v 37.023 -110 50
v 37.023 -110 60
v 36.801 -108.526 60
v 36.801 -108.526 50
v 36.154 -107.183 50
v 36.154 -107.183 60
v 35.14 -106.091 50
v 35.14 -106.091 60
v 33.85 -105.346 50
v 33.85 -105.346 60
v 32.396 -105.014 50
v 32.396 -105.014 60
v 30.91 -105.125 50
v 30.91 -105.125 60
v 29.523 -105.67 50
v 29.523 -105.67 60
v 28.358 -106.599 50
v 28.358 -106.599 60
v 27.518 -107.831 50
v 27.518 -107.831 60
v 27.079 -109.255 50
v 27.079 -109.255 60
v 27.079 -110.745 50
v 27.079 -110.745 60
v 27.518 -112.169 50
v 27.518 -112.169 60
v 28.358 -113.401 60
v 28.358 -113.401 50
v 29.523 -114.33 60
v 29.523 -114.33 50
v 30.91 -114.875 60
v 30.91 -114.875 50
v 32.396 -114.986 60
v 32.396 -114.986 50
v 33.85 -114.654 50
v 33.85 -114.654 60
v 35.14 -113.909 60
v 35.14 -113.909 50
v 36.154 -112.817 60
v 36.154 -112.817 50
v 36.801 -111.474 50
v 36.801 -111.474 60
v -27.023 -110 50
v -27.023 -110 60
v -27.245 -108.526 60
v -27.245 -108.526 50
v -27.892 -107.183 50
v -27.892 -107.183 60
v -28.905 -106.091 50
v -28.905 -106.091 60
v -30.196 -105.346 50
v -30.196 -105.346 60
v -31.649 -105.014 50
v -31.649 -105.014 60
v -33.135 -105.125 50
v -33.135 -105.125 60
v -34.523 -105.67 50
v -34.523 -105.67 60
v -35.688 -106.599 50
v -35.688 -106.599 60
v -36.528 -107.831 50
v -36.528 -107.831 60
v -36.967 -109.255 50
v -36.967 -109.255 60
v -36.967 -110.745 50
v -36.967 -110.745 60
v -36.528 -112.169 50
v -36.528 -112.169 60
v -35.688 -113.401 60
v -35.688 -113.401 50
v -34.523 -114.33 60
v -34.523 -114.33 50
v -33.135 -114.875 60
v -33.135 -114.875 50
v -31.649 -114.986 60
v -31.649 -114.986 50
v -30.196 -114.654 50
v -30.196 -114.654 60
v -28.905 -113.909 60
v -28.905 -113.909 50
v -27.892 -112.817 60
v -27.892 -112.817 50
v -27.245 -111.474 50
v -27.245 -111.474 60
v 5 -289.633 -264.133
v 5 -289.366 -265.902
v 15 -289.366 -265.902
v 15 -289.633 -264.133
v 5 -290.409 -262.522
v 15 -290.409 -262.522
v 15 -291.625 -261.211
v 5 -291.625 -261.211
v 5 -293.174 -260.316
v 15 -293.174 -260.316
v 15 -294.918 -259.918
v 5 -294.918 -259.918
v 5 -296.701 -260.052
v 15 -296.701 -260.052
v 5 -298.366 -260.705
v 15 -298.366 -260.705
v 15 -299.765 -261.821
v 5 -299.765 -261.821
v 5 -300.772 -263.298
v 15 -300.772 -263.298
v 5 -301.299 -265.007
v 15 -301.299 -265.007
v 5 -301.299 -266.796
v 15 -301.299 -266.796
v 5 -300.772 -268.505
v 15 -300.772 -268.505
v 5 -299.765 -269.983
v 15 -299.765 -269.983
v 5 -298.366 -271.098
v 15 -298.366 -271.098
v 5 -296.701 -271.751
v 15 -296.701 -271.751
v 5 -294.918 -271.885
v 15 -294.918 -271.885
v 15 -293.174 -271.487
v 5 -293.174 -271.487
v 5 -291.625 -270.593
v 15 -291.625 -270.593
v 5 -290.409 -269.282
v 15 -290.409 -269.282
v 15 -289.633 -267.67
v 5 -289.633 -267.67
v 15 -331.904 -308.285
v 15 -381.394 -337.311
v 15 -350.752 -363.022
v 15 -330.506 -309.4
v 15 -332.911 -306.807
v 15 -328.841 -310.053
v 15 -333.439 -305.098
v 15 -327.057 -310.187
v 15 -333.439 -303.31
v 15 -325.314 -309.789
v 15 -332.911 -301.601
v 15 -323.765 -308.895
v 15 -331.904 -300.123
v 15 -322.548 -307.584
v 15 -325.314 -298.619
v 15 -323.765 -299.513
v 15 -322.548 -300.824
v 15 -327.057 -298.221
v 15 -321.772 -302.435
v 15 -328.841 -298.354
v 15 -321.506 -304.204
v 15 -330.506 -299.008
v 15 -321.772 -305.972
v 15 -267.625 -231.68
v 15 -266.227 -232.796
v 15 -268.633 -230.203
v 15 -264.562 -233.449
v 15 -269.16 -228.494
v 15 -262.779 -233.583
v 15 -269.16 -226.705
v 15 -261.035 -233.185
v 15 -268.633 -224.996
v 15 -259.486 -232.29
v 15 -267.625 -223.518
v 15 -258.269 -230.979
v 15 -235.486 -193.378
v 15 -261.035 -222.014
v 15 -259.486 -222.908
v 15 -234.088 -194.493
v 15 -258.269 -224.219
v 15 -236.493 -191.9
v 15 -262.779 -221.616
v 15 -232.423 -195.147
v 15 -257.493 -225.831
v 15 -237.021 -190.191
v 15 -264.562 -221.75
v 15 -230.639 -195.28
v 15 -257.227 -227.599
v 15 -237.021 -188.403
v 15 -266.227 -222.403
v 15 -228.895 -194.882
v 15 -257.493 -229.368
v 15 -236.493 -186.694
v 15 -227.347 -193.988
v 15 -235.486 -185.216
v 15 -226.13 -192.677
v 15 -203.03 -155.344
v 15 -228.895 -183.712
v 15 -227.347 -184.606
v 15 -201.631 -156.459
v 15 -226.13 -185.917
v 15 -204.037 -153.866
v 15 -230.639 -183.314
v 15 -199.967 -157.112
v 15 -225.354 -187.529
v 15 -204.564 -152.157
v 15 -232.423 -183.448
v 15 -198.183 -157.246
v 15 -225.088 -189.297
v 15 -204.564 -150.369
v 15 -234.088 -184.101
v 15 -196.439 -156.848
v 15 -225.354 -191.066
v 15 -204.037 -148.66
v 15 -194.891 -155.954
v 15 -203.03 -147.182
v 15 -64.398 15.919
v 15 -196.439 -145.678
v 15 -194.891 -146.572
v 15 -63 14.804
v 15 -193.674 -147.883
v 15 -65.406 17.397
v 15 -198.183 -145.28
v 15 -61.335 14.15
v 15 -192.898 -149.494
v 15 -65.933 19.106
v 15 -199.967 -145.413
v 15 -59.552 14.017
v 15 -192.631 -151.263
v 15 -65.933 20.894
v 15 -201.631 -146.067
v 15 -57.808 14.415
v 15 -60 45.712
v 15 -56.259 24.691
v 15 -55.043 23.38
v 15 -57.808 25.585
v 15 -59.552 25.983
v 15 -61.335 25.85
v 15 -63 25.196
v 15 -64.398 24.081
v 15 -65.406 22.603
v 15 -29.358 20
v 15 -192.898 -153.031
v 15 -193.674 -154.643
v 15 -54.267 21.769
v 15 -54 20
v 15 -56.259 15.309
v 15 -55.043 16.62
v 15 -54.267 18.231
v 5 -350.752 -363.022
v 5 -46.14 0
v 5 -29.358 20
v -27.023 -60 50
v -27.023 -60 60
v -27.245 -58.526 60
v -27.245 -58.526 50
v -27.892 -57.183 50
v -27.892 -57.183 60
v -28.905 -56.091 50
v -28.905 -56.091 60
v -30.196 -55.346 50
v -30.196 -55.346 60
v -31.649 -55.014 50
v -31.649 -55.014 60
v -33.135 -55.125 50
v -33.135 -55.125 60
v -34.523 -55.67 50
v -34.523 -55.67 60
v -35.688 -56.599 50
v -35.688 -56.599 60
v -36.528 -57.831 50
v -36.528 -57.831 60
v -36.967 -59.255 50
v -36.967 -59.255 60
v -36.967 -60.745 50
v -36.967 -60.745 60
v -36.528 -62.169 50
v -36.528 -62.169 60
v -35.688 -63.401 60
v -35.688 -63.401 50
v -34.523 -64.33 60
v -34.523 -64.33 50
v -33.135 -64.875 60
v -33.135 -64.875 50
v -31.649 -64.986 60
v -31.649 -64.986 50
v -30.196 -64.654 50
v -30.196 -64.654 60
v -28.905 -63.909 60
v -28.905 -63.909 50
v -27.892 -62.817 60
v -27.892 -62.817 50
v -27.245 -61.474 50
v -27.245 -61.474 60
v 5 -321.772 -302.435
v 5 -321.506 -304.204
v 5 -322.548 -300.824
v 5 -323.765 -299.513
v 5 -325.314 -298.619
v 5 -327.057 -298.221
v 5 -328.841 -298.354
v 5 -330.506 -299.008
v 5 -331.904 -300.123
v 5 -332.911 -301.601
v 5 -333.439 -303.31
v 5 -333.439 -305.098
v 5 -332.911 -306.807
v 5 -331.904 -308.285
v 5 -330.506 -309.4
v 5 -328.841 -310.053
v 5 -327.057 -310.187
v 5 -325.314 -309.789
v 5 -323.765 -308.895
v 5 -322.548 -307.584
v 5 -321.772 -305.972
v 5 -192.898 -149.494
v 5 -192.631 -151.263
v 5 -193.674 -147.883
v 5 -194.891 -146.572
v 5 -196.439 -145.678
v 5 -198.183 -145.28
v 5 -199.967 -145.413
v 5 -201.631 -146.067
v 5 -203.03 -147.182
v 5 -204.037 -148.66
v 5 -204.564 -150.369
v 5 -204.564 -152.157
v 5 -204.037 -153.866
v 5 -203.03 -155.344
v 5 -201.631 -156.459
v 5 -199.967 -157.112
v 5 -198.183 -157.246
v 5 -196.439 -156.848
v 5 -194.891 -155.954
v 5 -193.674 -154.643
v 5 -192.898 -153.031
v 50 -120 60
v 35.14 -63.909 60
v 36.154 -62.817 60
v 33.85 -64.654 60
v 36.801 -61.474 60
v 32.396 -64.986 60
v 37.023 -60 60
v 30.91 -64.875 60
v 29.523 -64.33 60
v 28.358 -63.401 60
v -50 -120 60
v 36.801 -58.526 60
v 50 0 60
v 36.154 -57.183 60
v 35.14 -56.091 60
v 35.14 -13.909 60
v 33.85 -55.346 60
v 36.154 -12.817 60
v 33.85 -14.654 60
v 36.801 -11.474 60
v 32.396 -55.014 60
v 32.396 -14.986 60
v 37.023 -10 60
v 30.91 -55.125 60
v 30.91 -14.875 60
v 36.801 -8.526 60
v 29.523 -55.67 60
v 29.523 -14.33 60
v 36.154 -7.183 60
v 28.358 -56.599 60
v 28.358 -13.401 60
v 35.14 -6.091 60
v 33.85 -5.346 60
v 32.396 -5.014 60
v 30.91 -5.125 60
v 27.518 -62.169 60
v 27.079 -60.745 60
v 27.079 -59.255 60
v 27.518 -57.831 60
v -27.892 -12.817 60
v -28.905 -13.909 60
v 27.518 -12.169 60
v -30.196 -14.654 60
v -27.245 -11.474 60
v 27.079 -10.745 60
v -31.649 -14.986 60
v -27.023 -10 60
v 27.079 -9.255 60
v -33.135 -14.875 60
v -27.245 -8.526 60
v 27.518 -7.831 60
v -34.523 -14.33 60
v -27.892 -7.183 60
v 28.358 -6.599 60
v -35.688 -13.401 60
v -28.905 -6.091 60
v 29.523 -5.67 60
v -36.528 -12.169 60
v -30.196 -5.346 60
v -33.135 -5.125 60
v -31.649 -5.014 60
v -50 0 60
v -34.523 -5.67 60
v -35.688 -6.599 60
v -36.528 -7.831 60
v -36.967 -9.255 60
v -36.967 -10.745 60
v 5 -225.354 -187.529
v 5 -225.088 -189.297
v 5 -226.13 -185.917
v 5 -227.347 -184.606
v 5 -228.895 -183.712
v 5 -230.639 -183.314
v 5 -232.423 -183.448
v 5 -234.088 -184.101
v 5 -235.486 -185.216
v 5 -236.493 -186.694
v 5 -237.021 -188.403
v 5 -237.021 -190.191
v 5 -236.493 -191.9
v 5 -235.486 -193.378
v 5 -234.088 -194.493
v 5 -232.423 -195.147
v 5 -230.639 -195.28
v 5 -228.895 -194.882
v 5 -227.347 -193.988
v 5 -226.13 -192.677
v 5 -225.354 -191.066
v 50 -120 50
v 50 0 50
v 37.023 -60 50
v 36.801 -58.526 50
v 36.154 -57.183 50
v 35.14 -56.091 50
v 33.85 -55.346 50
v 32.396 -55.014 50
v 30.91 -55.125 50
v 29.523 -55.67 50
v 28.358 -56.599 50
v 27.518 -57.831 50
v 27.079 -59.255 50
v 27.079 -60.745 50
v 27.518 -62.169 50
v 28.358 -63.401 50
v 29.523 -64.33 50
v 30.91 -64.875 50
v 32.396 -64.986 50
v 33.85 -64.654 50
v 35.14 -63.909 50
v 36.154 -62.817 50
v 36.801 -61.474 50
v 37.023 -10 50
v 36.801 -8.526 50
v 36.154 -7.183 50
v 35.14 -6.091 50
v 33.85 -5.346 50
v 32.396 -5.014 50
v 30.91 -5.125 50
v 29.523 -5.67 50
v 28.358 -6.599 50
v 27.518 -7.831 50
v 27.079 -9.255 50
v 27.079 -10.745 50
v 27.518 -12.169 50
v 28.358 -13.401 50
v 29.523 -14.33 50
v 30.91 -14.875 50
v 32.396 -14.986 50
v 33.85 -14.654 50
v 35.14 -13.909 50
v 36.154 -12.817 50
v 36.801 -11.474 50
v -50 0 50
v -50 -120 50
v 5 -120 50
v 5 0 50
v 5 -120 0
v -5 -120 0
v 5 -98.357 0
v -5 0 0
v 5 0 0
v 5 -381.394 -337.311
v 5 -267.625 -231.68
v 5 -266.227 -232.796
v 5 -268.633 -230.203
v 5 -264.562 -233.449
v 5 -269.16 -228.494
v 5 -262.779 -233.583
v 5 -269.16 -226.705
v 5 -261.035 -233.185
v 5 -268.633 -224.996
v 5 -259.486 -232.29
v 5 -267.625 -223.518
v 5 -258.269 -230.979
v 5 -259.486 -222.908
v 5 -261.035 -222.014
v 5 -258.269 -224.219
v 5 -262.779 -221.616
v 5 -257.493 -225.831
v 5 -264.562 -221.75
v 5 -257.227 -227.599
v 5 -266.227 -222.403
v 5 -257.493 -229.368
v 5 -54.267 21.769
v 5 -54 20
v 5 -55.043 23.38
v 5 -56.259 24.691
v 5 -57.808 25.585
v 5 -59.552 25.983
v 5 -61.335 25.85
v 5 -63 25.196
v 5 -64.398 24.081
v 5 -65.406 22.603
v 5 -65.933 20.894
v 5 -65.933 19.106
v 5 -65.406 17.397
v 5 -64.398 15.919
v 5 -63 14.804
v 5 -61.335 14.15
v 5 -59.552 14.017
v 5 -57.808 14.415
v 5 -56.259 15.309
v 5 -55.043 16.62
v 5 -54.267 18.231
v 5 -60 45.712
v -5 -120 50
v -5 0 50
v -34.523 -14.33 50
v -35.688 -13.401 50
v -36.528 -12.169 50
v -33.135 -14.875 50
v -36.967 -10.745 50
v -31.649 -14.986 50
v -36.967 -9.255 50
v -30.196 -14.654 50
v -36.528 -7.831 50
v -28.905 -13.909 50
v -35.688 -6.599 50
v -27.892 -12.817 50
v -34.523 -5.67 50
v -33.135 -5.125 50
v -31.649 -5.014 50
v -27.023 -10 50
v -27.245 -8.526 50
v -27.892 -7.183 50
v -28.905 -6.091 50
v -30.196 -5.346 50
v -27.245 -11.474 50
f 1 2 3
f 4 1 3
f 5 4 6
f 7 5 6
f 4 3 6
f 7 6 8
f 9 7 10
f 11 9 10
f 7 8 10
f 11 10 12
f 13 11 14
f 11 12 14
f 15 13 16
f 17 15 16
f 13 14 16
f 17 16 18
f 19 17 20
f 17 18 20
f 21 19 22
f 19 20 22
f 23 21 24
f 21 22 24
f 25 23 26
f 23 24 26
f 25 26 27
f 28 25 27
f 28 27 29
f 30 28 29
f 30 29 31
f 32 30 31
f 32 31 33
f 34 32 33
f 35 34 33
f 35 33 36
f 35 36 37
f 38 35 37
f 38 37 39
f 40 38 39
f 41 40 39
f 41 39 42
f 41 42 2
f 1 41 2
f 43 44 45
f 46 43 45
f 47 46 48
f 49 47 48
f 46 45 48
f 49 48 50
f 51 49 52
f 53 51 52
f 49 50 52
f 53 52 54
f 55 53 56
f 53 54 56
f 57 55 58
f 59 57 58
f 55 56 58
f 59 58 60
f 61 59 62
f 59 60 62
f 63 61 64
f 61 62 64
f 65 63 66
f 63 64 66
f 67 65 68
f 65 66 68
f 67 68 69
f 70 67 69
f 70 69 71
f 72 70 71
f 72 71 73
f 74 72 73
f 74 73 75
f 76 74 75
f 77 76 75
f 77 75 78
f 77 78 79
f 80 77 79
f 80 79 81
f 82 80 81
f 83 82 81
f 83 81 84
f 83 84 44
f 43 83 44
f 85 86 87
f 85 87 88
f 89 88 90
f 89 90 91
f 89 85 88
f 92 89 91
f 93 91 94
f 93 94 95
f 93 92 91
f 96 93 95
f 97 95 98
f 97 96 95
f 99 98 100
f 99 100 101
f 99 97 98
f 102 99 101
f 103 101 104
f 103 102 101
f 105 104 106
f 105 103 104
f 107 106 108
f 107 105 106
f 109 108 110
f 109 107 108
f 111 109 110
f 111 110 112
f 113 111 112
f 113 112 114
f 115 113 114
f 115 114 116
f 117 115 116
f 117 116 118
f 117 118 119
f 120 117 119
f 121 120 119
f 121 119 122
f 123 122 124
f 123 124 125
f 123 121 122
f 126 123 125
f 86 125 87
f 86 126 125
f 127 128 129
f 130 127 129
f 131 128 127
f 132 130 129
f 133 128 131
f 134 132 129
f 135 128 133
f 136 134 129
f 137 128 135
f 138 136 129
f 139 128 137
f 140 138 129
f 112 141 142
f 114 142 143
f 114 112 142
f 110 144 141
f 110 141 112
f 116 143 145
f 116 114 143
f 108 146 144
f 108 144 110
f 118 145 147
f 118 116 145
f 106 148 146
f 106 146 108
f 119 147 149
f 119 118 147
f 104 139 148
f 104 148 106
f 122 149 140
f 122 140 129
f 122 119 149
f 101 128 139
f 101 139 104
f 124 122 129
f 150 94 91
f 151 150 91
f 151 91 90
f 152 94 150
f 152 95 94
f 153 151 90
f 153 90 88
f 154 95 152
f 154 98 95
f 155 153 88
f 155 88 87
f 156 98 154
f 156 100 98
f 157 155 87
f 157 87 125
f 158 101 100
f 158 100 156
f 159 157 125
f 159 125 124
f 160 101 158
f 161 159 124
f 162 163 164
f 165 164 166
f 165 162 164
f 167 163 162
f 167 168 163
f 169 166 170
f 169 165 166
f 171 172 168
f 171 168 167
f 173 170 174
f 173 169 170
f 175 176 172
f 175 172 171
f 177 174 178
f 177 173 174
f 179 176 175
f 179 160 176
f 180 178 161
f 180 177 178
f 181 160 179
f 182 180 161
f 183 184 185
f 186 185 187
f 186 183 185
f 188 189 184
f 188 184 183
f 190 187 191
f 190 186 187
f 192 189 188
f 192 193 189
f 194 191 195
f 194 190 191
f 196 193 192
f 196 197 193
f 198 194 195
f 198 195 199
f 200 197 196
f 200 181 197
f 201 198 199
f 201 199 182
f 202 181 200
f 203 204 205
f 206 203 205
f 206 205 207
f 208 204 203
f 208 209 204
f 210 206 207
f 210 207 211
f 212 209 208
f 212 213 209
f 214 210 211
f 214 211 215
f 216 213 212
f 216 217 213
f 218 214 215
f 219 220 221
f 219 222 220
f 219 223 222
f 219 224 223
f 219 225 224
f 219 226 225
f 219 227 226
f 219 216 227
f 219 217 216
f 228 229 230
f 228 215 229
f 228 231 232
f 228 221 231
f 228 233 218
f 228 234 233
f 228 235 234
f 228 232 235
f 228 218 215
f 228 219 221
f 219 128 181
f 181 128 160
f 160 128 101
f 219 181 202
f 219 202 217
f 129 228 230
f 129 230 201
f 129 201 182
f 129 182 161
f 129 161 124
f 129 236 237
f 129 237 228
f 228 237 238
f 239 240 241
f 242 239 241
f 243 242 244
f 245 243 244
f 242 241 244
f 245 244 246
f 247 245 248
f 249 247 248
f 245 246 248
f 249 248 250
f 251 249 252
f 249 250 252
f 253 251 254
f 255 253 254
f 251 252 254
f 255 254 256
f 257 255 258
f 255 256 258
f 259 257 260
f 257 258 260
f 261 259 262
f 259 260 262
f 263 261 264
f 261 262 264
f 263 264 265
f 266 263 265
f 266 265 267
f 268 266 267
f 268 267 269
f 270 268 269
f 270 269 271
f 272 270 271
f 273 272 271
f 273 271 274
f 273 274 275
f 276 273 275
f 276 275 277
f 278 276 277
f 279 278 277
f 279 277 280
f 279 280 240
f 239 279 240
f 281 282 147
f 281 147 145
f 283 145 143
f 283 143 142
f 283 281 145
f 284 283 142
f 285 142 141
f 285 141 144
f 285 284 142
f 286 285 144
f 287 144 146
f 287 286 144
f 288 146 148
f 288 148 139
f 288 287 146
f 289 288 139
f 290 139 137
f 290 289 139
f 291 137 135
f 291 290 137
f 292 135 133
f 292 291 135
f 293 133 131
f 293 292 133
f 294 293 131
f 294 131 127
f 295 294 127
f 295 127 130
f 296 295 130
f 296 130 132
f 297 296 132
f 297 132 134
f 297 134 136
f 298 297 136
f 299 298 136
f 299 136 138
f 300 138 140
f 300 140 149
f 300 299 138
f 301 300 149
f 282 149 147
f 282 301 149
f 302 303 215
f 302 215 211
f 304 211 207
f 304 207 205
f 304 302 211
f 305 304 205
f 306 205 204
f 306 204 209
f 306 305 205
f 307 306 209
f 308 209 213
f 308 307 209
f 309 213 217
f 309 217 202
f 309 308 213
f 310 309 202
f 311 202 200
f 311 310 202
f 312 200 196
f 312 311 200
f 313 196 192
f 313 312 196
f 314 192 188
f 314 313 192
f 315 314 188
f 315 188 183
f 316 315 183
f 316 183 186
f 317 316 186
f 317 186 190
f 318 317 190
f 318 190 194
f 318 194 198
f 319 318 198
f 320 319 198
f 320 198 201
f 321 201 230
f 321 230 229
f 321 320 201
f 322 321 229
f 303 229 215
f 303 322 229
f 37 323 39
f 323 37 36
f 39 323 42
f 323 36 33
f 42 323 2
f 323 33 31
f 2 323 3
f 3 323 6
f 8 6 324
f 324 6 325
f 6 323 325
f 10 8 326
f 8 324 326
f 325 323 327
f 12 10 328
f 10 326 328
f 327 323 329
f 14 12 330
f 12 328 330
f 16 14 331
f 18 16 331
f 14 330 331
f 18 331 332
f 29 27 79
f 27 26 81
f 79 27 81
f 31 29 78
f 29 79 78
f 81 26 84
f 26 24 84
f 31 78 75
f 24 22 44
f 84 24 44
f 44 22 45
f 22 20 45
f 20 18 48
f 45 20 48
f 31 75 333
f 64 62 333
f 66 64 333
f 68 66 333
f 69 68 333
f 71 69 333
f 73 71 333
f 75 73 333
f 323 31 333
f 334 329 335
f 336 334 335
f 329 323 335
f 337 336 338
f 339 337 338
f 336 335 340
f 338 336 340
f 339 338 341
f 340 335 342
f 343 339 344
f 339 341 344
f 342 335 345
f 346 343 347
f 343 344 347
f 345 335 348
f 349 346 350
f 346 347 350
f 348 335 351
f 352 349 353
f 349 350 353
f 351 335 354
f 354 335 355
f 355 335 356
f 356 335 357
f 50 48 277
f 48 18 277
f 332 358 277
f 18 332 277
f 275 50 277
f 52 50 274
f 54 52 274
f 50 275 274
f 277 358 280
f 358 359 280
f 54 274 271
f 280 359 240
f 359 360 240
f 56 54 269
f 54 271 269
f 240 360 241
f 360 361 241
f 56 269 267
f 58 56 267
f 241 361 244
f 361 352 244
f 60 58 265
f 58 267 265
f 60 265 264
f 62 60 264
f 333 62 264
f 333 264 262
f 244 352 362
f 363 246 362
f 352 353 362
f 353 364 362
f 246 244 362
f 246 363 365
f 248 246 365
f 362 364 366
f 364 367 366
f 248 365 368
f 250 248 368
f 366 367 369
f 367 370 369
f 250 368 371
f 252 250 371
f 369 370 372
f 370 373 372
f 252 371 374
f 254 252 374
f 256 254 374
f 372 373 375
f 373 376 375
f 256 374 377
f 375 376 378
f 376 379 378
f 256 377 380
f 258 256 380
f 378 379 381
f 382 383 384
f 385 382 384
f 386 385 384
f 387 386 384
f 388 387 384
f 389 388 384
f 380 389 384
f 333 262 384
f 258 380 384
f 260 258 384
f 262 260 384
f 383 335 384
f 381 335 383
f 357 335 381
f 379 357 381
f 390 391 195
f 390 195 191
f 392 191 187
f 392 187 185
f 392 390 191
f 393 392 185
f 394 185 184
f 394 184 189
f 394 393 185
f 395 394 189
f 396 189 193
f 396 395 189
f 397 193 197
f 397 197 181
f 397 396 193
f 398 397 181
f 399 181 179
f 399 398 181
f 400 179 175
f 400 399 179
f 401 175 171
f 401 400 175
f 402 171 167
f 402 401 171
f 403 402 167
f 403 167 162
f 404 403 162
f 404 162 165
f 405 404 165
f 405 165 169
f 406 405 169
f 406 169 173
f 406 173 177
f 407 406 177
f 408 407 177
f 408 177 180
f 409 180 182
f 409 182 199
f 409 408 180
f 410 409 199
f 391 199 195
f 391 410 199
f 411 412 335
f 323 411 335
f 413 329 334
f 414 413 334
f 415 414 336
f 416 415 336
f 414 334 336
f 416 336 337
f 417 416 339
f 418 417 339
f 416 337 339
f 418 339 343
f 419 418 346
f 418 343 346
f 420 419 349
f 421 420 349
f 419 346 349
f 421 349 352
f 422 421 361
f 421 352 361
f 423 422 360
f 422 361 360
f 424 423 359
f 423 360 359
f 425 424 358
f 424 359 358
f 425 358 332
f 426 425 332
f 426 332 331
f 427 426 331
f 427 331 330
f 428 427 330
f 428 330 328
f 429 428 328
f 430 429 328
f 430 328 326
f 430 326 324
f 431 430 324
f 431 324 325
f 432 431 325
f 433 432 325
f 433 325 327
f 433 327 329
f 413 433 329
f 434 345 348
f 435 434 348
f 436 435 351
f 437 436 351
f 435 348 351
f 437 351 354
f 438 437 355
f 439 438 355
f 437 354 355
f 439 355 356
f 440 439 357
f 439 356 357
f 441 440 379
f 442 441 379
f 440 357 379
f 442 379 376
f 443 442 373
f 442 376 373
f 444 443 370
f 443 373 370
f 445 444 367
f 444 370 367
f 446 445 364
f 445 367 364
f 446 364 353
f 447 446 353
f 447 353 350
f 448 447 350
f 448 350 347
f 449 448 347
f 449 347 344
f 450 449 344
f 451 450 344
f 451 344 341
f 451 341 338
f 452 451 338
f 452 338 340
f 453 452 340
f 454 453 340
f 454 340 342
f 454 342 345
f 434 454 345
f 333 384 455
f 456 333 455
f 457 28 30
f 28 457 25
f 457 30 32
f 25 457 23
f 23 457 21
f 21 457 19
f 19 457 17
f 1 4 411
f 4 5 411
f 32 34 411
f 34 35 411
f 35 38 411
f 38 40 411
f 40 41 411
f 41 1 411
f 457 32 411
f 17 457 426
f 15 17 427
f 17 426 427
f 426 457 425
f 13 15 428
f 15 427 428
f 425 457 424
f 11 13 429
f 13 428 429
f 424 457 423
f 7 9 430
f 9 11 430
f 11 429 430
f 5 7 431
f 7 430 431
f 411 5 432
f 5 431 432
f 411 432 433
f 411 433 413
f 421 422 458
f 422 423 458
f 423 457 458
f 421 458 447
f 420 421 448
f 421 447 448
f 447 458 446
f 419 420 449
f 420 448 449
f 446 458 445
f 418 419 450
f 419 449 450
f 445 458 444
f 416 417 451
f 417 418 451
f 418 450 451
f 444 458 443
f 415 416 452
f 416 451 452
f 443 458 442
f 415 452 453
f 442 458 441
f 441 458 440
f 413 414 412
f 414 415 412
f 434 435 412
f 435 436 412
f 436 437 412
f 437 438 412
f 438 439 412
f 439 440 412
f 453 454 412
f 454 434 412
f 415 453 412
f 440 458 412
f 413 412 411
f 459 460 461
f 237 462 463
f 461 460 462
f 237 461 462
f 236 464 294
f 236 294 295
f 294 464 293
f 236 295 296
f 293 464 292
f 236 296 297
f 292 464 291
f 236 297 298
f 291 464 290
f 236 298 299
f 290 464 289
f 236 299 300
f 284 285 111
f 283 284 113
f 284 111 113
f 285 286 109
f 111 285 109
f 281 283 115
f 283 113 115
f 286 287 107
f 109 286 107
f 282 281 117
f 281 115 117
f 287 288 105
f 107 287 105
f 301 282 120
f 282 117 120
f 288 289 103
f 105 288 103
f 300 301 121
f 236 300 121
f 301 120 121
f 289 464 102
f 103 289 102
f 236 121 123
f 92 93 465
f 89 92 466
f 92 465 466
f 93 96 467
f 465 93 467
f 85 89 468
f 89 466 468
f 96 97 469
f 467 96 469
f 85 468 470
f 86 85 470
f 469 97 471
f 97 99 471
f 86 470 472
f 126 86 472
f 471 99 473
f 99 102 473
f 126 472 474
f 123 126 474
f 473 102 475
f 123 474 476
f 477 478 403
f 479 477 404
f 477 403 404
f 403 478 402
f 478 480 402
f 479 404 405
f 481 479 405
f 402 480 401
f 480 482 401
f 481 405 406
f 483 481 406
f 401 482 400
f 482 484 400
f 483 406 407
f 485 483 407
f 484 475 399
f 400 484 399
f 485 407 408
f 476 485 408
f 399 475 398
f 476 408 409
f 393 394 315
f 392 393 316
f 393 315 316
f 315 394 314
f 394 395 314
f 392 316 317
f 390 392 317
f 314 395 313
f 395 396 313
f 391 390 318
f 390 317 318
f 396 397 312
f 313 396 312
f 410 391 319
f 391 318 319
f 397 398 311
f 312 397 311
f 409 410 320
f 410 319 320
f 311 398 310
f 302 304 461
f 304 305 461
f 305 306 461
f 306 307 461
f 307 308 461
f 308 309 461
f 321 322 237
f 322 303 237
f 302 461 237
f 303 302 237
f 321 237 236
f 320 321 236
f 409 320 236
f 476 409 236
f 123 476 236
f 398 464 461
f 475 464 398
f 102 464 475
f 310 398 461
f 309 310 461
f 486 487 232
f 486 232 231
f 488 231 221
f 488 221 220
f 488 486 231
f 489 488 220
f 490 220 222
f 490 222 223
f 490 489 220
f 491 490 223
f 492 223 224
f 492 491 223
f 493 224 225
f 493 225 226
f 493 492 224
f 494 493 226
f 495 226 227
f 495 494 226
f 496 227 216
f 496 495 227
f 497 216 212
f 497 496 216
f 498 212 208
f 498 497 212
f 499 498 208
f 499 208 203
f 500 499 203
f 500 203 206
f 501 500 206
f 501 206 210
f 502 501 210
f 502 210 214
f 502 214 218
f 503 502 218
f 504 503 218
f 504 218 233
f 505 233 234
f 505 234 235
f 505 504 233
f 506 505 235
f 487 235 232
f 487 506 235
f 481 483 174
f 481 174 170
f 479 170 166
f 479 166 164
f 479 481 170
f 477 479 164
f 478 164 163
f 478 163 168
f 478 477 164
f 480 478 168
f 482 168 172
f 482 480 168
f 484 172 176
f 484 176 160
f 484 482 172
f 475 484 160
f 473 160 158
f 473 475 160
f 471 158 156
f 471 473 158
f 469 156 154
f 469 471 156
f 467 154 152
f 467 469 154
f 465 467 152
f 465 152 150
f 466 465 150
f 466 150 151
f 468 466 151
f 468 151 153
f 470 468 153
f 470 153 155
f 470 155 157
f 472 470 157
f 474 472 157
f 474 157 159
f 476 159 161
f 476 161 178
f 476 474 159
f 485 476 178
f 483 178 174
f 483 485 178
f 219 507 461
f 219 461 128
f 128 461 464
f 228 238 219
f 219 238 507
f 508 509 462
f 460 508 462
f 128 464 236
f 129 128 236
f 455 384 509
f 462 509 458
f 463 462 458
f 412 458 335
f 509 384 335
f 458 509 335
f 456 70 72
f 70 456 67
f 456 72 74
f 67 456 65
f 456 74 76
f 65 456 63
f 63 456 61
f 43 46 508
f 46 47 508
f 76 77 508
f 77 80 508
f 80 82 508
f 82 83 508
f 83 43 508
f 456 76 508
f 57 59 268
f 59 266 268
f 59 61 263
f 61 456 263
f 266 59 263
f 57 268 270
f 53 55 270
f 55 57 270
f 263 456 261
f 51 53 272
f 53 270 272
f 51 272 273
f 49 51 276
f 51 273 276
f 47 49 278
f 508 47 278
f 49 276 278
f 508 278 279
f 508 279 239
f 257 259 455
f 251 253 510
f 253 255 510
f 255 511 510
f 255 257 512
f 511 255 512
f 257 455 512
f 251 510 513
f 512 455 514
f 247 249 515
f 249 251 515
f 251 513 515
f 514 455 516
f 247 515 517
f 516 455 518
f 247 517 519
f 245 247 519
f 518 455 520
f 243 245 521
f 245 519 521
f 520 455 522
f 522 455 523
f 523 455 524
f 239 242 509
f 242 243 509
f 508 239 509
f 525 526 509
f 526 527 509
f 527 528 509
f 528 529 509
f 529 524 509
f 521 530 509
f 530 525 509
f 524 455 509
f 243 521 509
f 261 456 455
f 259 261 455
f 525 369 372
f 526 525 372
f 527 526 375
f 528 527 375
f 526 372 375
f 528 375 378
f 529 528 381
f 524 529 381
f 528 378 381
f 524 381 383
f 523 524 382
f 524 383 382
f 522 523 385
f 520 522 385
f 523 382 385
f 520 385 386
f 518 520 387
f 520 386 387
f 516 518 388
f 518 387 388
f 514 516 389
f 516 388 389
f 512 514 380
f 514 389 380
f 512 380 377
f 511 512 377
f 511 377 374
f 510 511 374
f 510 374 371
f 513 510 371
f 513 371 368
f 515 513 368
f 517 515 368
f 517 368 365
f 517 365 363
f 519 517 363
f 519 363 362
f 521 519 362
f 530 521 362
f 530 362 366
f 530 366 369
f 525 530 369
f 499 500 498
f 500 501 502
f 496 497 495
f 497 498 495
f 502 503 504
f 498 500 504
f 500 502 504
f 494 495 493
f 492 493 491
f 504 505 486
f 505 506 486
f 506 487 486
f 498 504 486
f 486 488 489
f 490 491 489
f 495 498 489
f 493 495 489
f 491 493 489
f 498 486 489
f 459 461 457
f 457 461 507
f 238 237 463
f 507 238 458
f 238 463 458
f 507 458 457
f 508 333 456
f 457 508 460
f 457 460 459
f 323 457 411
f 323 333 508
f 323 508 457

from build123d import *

# Parameters (mm, degrees)
F1_DEPTH = 120
F2_R     = 6
F3_DEPTH = 10
F4_R     = 5
F5_DEPTH = 423.023222


with BuildPart() as f1:
    # F0 (on Front) → F1 (new body)
    with BuildSketch(Plane.XZ):
        Polygon((-5, 50), (-5, 0), (5, 0), (5, 50), (50, 50), (50, 60), (-50, 60), (-50, 50), align=None)
    extrude(amount=F1_DEPTH)

    # F2 (on face) → F3 (join)
    with BuildSketch(Plane.YZ.offset(5)):
        Polygon((-29.358222, 20), (-60, 45.711504), (-381.393805, -337.310717), (-350.752027, -363.022222), align=None)
        with Locations((-327.505659, -304.203803)):
            Circle(F2_R, mode=Mode.SUBTRACT)
        with Locations((-295.366279, -265.901581)):
            Circle(F2_R, mode=Mode.SUBTRACT)
        with Locations((-263.226898, -227.599358)):
            Circle(F2_R, mode=Mode.SUBTRACT)
        with Locations((-231.087518, -189.297136)):
            Circle(F2_R, mode=Mode.SUBTRACT)
        with Locations((-198.631472, -151.262874)):
            Circle(F2_R, mode=Mode.SUBTRACT)
        with Locations((-60, 20)):
            Circle(F2_R, mode=Mode.SUBTRACT)
    extrude(amount=F3_DEPTH)

    # F4 (on face) → F5 (cut, through all)
    with BuildSketch(Plane.XY.offset(60)):
        with Locations((-32.022849, -10)):
            Circle(F4_R)
        with Locations((-32.022849, -60)):
            Circle(F4_R)
        with Locations((-32.022849, -110)):
            Circle(F4_R)
        with Locations((32.022849, -110)):
            Circle(F4_R)
        with Locations((32.022849, -60)):
            Circle(F4_R)
        with Locations((32.022849, -10)):
            Circle(F4_R)
    extrude(amount=-F5_DEPTH, mode=Mode.SUBTRACT)


solid = f1.part
